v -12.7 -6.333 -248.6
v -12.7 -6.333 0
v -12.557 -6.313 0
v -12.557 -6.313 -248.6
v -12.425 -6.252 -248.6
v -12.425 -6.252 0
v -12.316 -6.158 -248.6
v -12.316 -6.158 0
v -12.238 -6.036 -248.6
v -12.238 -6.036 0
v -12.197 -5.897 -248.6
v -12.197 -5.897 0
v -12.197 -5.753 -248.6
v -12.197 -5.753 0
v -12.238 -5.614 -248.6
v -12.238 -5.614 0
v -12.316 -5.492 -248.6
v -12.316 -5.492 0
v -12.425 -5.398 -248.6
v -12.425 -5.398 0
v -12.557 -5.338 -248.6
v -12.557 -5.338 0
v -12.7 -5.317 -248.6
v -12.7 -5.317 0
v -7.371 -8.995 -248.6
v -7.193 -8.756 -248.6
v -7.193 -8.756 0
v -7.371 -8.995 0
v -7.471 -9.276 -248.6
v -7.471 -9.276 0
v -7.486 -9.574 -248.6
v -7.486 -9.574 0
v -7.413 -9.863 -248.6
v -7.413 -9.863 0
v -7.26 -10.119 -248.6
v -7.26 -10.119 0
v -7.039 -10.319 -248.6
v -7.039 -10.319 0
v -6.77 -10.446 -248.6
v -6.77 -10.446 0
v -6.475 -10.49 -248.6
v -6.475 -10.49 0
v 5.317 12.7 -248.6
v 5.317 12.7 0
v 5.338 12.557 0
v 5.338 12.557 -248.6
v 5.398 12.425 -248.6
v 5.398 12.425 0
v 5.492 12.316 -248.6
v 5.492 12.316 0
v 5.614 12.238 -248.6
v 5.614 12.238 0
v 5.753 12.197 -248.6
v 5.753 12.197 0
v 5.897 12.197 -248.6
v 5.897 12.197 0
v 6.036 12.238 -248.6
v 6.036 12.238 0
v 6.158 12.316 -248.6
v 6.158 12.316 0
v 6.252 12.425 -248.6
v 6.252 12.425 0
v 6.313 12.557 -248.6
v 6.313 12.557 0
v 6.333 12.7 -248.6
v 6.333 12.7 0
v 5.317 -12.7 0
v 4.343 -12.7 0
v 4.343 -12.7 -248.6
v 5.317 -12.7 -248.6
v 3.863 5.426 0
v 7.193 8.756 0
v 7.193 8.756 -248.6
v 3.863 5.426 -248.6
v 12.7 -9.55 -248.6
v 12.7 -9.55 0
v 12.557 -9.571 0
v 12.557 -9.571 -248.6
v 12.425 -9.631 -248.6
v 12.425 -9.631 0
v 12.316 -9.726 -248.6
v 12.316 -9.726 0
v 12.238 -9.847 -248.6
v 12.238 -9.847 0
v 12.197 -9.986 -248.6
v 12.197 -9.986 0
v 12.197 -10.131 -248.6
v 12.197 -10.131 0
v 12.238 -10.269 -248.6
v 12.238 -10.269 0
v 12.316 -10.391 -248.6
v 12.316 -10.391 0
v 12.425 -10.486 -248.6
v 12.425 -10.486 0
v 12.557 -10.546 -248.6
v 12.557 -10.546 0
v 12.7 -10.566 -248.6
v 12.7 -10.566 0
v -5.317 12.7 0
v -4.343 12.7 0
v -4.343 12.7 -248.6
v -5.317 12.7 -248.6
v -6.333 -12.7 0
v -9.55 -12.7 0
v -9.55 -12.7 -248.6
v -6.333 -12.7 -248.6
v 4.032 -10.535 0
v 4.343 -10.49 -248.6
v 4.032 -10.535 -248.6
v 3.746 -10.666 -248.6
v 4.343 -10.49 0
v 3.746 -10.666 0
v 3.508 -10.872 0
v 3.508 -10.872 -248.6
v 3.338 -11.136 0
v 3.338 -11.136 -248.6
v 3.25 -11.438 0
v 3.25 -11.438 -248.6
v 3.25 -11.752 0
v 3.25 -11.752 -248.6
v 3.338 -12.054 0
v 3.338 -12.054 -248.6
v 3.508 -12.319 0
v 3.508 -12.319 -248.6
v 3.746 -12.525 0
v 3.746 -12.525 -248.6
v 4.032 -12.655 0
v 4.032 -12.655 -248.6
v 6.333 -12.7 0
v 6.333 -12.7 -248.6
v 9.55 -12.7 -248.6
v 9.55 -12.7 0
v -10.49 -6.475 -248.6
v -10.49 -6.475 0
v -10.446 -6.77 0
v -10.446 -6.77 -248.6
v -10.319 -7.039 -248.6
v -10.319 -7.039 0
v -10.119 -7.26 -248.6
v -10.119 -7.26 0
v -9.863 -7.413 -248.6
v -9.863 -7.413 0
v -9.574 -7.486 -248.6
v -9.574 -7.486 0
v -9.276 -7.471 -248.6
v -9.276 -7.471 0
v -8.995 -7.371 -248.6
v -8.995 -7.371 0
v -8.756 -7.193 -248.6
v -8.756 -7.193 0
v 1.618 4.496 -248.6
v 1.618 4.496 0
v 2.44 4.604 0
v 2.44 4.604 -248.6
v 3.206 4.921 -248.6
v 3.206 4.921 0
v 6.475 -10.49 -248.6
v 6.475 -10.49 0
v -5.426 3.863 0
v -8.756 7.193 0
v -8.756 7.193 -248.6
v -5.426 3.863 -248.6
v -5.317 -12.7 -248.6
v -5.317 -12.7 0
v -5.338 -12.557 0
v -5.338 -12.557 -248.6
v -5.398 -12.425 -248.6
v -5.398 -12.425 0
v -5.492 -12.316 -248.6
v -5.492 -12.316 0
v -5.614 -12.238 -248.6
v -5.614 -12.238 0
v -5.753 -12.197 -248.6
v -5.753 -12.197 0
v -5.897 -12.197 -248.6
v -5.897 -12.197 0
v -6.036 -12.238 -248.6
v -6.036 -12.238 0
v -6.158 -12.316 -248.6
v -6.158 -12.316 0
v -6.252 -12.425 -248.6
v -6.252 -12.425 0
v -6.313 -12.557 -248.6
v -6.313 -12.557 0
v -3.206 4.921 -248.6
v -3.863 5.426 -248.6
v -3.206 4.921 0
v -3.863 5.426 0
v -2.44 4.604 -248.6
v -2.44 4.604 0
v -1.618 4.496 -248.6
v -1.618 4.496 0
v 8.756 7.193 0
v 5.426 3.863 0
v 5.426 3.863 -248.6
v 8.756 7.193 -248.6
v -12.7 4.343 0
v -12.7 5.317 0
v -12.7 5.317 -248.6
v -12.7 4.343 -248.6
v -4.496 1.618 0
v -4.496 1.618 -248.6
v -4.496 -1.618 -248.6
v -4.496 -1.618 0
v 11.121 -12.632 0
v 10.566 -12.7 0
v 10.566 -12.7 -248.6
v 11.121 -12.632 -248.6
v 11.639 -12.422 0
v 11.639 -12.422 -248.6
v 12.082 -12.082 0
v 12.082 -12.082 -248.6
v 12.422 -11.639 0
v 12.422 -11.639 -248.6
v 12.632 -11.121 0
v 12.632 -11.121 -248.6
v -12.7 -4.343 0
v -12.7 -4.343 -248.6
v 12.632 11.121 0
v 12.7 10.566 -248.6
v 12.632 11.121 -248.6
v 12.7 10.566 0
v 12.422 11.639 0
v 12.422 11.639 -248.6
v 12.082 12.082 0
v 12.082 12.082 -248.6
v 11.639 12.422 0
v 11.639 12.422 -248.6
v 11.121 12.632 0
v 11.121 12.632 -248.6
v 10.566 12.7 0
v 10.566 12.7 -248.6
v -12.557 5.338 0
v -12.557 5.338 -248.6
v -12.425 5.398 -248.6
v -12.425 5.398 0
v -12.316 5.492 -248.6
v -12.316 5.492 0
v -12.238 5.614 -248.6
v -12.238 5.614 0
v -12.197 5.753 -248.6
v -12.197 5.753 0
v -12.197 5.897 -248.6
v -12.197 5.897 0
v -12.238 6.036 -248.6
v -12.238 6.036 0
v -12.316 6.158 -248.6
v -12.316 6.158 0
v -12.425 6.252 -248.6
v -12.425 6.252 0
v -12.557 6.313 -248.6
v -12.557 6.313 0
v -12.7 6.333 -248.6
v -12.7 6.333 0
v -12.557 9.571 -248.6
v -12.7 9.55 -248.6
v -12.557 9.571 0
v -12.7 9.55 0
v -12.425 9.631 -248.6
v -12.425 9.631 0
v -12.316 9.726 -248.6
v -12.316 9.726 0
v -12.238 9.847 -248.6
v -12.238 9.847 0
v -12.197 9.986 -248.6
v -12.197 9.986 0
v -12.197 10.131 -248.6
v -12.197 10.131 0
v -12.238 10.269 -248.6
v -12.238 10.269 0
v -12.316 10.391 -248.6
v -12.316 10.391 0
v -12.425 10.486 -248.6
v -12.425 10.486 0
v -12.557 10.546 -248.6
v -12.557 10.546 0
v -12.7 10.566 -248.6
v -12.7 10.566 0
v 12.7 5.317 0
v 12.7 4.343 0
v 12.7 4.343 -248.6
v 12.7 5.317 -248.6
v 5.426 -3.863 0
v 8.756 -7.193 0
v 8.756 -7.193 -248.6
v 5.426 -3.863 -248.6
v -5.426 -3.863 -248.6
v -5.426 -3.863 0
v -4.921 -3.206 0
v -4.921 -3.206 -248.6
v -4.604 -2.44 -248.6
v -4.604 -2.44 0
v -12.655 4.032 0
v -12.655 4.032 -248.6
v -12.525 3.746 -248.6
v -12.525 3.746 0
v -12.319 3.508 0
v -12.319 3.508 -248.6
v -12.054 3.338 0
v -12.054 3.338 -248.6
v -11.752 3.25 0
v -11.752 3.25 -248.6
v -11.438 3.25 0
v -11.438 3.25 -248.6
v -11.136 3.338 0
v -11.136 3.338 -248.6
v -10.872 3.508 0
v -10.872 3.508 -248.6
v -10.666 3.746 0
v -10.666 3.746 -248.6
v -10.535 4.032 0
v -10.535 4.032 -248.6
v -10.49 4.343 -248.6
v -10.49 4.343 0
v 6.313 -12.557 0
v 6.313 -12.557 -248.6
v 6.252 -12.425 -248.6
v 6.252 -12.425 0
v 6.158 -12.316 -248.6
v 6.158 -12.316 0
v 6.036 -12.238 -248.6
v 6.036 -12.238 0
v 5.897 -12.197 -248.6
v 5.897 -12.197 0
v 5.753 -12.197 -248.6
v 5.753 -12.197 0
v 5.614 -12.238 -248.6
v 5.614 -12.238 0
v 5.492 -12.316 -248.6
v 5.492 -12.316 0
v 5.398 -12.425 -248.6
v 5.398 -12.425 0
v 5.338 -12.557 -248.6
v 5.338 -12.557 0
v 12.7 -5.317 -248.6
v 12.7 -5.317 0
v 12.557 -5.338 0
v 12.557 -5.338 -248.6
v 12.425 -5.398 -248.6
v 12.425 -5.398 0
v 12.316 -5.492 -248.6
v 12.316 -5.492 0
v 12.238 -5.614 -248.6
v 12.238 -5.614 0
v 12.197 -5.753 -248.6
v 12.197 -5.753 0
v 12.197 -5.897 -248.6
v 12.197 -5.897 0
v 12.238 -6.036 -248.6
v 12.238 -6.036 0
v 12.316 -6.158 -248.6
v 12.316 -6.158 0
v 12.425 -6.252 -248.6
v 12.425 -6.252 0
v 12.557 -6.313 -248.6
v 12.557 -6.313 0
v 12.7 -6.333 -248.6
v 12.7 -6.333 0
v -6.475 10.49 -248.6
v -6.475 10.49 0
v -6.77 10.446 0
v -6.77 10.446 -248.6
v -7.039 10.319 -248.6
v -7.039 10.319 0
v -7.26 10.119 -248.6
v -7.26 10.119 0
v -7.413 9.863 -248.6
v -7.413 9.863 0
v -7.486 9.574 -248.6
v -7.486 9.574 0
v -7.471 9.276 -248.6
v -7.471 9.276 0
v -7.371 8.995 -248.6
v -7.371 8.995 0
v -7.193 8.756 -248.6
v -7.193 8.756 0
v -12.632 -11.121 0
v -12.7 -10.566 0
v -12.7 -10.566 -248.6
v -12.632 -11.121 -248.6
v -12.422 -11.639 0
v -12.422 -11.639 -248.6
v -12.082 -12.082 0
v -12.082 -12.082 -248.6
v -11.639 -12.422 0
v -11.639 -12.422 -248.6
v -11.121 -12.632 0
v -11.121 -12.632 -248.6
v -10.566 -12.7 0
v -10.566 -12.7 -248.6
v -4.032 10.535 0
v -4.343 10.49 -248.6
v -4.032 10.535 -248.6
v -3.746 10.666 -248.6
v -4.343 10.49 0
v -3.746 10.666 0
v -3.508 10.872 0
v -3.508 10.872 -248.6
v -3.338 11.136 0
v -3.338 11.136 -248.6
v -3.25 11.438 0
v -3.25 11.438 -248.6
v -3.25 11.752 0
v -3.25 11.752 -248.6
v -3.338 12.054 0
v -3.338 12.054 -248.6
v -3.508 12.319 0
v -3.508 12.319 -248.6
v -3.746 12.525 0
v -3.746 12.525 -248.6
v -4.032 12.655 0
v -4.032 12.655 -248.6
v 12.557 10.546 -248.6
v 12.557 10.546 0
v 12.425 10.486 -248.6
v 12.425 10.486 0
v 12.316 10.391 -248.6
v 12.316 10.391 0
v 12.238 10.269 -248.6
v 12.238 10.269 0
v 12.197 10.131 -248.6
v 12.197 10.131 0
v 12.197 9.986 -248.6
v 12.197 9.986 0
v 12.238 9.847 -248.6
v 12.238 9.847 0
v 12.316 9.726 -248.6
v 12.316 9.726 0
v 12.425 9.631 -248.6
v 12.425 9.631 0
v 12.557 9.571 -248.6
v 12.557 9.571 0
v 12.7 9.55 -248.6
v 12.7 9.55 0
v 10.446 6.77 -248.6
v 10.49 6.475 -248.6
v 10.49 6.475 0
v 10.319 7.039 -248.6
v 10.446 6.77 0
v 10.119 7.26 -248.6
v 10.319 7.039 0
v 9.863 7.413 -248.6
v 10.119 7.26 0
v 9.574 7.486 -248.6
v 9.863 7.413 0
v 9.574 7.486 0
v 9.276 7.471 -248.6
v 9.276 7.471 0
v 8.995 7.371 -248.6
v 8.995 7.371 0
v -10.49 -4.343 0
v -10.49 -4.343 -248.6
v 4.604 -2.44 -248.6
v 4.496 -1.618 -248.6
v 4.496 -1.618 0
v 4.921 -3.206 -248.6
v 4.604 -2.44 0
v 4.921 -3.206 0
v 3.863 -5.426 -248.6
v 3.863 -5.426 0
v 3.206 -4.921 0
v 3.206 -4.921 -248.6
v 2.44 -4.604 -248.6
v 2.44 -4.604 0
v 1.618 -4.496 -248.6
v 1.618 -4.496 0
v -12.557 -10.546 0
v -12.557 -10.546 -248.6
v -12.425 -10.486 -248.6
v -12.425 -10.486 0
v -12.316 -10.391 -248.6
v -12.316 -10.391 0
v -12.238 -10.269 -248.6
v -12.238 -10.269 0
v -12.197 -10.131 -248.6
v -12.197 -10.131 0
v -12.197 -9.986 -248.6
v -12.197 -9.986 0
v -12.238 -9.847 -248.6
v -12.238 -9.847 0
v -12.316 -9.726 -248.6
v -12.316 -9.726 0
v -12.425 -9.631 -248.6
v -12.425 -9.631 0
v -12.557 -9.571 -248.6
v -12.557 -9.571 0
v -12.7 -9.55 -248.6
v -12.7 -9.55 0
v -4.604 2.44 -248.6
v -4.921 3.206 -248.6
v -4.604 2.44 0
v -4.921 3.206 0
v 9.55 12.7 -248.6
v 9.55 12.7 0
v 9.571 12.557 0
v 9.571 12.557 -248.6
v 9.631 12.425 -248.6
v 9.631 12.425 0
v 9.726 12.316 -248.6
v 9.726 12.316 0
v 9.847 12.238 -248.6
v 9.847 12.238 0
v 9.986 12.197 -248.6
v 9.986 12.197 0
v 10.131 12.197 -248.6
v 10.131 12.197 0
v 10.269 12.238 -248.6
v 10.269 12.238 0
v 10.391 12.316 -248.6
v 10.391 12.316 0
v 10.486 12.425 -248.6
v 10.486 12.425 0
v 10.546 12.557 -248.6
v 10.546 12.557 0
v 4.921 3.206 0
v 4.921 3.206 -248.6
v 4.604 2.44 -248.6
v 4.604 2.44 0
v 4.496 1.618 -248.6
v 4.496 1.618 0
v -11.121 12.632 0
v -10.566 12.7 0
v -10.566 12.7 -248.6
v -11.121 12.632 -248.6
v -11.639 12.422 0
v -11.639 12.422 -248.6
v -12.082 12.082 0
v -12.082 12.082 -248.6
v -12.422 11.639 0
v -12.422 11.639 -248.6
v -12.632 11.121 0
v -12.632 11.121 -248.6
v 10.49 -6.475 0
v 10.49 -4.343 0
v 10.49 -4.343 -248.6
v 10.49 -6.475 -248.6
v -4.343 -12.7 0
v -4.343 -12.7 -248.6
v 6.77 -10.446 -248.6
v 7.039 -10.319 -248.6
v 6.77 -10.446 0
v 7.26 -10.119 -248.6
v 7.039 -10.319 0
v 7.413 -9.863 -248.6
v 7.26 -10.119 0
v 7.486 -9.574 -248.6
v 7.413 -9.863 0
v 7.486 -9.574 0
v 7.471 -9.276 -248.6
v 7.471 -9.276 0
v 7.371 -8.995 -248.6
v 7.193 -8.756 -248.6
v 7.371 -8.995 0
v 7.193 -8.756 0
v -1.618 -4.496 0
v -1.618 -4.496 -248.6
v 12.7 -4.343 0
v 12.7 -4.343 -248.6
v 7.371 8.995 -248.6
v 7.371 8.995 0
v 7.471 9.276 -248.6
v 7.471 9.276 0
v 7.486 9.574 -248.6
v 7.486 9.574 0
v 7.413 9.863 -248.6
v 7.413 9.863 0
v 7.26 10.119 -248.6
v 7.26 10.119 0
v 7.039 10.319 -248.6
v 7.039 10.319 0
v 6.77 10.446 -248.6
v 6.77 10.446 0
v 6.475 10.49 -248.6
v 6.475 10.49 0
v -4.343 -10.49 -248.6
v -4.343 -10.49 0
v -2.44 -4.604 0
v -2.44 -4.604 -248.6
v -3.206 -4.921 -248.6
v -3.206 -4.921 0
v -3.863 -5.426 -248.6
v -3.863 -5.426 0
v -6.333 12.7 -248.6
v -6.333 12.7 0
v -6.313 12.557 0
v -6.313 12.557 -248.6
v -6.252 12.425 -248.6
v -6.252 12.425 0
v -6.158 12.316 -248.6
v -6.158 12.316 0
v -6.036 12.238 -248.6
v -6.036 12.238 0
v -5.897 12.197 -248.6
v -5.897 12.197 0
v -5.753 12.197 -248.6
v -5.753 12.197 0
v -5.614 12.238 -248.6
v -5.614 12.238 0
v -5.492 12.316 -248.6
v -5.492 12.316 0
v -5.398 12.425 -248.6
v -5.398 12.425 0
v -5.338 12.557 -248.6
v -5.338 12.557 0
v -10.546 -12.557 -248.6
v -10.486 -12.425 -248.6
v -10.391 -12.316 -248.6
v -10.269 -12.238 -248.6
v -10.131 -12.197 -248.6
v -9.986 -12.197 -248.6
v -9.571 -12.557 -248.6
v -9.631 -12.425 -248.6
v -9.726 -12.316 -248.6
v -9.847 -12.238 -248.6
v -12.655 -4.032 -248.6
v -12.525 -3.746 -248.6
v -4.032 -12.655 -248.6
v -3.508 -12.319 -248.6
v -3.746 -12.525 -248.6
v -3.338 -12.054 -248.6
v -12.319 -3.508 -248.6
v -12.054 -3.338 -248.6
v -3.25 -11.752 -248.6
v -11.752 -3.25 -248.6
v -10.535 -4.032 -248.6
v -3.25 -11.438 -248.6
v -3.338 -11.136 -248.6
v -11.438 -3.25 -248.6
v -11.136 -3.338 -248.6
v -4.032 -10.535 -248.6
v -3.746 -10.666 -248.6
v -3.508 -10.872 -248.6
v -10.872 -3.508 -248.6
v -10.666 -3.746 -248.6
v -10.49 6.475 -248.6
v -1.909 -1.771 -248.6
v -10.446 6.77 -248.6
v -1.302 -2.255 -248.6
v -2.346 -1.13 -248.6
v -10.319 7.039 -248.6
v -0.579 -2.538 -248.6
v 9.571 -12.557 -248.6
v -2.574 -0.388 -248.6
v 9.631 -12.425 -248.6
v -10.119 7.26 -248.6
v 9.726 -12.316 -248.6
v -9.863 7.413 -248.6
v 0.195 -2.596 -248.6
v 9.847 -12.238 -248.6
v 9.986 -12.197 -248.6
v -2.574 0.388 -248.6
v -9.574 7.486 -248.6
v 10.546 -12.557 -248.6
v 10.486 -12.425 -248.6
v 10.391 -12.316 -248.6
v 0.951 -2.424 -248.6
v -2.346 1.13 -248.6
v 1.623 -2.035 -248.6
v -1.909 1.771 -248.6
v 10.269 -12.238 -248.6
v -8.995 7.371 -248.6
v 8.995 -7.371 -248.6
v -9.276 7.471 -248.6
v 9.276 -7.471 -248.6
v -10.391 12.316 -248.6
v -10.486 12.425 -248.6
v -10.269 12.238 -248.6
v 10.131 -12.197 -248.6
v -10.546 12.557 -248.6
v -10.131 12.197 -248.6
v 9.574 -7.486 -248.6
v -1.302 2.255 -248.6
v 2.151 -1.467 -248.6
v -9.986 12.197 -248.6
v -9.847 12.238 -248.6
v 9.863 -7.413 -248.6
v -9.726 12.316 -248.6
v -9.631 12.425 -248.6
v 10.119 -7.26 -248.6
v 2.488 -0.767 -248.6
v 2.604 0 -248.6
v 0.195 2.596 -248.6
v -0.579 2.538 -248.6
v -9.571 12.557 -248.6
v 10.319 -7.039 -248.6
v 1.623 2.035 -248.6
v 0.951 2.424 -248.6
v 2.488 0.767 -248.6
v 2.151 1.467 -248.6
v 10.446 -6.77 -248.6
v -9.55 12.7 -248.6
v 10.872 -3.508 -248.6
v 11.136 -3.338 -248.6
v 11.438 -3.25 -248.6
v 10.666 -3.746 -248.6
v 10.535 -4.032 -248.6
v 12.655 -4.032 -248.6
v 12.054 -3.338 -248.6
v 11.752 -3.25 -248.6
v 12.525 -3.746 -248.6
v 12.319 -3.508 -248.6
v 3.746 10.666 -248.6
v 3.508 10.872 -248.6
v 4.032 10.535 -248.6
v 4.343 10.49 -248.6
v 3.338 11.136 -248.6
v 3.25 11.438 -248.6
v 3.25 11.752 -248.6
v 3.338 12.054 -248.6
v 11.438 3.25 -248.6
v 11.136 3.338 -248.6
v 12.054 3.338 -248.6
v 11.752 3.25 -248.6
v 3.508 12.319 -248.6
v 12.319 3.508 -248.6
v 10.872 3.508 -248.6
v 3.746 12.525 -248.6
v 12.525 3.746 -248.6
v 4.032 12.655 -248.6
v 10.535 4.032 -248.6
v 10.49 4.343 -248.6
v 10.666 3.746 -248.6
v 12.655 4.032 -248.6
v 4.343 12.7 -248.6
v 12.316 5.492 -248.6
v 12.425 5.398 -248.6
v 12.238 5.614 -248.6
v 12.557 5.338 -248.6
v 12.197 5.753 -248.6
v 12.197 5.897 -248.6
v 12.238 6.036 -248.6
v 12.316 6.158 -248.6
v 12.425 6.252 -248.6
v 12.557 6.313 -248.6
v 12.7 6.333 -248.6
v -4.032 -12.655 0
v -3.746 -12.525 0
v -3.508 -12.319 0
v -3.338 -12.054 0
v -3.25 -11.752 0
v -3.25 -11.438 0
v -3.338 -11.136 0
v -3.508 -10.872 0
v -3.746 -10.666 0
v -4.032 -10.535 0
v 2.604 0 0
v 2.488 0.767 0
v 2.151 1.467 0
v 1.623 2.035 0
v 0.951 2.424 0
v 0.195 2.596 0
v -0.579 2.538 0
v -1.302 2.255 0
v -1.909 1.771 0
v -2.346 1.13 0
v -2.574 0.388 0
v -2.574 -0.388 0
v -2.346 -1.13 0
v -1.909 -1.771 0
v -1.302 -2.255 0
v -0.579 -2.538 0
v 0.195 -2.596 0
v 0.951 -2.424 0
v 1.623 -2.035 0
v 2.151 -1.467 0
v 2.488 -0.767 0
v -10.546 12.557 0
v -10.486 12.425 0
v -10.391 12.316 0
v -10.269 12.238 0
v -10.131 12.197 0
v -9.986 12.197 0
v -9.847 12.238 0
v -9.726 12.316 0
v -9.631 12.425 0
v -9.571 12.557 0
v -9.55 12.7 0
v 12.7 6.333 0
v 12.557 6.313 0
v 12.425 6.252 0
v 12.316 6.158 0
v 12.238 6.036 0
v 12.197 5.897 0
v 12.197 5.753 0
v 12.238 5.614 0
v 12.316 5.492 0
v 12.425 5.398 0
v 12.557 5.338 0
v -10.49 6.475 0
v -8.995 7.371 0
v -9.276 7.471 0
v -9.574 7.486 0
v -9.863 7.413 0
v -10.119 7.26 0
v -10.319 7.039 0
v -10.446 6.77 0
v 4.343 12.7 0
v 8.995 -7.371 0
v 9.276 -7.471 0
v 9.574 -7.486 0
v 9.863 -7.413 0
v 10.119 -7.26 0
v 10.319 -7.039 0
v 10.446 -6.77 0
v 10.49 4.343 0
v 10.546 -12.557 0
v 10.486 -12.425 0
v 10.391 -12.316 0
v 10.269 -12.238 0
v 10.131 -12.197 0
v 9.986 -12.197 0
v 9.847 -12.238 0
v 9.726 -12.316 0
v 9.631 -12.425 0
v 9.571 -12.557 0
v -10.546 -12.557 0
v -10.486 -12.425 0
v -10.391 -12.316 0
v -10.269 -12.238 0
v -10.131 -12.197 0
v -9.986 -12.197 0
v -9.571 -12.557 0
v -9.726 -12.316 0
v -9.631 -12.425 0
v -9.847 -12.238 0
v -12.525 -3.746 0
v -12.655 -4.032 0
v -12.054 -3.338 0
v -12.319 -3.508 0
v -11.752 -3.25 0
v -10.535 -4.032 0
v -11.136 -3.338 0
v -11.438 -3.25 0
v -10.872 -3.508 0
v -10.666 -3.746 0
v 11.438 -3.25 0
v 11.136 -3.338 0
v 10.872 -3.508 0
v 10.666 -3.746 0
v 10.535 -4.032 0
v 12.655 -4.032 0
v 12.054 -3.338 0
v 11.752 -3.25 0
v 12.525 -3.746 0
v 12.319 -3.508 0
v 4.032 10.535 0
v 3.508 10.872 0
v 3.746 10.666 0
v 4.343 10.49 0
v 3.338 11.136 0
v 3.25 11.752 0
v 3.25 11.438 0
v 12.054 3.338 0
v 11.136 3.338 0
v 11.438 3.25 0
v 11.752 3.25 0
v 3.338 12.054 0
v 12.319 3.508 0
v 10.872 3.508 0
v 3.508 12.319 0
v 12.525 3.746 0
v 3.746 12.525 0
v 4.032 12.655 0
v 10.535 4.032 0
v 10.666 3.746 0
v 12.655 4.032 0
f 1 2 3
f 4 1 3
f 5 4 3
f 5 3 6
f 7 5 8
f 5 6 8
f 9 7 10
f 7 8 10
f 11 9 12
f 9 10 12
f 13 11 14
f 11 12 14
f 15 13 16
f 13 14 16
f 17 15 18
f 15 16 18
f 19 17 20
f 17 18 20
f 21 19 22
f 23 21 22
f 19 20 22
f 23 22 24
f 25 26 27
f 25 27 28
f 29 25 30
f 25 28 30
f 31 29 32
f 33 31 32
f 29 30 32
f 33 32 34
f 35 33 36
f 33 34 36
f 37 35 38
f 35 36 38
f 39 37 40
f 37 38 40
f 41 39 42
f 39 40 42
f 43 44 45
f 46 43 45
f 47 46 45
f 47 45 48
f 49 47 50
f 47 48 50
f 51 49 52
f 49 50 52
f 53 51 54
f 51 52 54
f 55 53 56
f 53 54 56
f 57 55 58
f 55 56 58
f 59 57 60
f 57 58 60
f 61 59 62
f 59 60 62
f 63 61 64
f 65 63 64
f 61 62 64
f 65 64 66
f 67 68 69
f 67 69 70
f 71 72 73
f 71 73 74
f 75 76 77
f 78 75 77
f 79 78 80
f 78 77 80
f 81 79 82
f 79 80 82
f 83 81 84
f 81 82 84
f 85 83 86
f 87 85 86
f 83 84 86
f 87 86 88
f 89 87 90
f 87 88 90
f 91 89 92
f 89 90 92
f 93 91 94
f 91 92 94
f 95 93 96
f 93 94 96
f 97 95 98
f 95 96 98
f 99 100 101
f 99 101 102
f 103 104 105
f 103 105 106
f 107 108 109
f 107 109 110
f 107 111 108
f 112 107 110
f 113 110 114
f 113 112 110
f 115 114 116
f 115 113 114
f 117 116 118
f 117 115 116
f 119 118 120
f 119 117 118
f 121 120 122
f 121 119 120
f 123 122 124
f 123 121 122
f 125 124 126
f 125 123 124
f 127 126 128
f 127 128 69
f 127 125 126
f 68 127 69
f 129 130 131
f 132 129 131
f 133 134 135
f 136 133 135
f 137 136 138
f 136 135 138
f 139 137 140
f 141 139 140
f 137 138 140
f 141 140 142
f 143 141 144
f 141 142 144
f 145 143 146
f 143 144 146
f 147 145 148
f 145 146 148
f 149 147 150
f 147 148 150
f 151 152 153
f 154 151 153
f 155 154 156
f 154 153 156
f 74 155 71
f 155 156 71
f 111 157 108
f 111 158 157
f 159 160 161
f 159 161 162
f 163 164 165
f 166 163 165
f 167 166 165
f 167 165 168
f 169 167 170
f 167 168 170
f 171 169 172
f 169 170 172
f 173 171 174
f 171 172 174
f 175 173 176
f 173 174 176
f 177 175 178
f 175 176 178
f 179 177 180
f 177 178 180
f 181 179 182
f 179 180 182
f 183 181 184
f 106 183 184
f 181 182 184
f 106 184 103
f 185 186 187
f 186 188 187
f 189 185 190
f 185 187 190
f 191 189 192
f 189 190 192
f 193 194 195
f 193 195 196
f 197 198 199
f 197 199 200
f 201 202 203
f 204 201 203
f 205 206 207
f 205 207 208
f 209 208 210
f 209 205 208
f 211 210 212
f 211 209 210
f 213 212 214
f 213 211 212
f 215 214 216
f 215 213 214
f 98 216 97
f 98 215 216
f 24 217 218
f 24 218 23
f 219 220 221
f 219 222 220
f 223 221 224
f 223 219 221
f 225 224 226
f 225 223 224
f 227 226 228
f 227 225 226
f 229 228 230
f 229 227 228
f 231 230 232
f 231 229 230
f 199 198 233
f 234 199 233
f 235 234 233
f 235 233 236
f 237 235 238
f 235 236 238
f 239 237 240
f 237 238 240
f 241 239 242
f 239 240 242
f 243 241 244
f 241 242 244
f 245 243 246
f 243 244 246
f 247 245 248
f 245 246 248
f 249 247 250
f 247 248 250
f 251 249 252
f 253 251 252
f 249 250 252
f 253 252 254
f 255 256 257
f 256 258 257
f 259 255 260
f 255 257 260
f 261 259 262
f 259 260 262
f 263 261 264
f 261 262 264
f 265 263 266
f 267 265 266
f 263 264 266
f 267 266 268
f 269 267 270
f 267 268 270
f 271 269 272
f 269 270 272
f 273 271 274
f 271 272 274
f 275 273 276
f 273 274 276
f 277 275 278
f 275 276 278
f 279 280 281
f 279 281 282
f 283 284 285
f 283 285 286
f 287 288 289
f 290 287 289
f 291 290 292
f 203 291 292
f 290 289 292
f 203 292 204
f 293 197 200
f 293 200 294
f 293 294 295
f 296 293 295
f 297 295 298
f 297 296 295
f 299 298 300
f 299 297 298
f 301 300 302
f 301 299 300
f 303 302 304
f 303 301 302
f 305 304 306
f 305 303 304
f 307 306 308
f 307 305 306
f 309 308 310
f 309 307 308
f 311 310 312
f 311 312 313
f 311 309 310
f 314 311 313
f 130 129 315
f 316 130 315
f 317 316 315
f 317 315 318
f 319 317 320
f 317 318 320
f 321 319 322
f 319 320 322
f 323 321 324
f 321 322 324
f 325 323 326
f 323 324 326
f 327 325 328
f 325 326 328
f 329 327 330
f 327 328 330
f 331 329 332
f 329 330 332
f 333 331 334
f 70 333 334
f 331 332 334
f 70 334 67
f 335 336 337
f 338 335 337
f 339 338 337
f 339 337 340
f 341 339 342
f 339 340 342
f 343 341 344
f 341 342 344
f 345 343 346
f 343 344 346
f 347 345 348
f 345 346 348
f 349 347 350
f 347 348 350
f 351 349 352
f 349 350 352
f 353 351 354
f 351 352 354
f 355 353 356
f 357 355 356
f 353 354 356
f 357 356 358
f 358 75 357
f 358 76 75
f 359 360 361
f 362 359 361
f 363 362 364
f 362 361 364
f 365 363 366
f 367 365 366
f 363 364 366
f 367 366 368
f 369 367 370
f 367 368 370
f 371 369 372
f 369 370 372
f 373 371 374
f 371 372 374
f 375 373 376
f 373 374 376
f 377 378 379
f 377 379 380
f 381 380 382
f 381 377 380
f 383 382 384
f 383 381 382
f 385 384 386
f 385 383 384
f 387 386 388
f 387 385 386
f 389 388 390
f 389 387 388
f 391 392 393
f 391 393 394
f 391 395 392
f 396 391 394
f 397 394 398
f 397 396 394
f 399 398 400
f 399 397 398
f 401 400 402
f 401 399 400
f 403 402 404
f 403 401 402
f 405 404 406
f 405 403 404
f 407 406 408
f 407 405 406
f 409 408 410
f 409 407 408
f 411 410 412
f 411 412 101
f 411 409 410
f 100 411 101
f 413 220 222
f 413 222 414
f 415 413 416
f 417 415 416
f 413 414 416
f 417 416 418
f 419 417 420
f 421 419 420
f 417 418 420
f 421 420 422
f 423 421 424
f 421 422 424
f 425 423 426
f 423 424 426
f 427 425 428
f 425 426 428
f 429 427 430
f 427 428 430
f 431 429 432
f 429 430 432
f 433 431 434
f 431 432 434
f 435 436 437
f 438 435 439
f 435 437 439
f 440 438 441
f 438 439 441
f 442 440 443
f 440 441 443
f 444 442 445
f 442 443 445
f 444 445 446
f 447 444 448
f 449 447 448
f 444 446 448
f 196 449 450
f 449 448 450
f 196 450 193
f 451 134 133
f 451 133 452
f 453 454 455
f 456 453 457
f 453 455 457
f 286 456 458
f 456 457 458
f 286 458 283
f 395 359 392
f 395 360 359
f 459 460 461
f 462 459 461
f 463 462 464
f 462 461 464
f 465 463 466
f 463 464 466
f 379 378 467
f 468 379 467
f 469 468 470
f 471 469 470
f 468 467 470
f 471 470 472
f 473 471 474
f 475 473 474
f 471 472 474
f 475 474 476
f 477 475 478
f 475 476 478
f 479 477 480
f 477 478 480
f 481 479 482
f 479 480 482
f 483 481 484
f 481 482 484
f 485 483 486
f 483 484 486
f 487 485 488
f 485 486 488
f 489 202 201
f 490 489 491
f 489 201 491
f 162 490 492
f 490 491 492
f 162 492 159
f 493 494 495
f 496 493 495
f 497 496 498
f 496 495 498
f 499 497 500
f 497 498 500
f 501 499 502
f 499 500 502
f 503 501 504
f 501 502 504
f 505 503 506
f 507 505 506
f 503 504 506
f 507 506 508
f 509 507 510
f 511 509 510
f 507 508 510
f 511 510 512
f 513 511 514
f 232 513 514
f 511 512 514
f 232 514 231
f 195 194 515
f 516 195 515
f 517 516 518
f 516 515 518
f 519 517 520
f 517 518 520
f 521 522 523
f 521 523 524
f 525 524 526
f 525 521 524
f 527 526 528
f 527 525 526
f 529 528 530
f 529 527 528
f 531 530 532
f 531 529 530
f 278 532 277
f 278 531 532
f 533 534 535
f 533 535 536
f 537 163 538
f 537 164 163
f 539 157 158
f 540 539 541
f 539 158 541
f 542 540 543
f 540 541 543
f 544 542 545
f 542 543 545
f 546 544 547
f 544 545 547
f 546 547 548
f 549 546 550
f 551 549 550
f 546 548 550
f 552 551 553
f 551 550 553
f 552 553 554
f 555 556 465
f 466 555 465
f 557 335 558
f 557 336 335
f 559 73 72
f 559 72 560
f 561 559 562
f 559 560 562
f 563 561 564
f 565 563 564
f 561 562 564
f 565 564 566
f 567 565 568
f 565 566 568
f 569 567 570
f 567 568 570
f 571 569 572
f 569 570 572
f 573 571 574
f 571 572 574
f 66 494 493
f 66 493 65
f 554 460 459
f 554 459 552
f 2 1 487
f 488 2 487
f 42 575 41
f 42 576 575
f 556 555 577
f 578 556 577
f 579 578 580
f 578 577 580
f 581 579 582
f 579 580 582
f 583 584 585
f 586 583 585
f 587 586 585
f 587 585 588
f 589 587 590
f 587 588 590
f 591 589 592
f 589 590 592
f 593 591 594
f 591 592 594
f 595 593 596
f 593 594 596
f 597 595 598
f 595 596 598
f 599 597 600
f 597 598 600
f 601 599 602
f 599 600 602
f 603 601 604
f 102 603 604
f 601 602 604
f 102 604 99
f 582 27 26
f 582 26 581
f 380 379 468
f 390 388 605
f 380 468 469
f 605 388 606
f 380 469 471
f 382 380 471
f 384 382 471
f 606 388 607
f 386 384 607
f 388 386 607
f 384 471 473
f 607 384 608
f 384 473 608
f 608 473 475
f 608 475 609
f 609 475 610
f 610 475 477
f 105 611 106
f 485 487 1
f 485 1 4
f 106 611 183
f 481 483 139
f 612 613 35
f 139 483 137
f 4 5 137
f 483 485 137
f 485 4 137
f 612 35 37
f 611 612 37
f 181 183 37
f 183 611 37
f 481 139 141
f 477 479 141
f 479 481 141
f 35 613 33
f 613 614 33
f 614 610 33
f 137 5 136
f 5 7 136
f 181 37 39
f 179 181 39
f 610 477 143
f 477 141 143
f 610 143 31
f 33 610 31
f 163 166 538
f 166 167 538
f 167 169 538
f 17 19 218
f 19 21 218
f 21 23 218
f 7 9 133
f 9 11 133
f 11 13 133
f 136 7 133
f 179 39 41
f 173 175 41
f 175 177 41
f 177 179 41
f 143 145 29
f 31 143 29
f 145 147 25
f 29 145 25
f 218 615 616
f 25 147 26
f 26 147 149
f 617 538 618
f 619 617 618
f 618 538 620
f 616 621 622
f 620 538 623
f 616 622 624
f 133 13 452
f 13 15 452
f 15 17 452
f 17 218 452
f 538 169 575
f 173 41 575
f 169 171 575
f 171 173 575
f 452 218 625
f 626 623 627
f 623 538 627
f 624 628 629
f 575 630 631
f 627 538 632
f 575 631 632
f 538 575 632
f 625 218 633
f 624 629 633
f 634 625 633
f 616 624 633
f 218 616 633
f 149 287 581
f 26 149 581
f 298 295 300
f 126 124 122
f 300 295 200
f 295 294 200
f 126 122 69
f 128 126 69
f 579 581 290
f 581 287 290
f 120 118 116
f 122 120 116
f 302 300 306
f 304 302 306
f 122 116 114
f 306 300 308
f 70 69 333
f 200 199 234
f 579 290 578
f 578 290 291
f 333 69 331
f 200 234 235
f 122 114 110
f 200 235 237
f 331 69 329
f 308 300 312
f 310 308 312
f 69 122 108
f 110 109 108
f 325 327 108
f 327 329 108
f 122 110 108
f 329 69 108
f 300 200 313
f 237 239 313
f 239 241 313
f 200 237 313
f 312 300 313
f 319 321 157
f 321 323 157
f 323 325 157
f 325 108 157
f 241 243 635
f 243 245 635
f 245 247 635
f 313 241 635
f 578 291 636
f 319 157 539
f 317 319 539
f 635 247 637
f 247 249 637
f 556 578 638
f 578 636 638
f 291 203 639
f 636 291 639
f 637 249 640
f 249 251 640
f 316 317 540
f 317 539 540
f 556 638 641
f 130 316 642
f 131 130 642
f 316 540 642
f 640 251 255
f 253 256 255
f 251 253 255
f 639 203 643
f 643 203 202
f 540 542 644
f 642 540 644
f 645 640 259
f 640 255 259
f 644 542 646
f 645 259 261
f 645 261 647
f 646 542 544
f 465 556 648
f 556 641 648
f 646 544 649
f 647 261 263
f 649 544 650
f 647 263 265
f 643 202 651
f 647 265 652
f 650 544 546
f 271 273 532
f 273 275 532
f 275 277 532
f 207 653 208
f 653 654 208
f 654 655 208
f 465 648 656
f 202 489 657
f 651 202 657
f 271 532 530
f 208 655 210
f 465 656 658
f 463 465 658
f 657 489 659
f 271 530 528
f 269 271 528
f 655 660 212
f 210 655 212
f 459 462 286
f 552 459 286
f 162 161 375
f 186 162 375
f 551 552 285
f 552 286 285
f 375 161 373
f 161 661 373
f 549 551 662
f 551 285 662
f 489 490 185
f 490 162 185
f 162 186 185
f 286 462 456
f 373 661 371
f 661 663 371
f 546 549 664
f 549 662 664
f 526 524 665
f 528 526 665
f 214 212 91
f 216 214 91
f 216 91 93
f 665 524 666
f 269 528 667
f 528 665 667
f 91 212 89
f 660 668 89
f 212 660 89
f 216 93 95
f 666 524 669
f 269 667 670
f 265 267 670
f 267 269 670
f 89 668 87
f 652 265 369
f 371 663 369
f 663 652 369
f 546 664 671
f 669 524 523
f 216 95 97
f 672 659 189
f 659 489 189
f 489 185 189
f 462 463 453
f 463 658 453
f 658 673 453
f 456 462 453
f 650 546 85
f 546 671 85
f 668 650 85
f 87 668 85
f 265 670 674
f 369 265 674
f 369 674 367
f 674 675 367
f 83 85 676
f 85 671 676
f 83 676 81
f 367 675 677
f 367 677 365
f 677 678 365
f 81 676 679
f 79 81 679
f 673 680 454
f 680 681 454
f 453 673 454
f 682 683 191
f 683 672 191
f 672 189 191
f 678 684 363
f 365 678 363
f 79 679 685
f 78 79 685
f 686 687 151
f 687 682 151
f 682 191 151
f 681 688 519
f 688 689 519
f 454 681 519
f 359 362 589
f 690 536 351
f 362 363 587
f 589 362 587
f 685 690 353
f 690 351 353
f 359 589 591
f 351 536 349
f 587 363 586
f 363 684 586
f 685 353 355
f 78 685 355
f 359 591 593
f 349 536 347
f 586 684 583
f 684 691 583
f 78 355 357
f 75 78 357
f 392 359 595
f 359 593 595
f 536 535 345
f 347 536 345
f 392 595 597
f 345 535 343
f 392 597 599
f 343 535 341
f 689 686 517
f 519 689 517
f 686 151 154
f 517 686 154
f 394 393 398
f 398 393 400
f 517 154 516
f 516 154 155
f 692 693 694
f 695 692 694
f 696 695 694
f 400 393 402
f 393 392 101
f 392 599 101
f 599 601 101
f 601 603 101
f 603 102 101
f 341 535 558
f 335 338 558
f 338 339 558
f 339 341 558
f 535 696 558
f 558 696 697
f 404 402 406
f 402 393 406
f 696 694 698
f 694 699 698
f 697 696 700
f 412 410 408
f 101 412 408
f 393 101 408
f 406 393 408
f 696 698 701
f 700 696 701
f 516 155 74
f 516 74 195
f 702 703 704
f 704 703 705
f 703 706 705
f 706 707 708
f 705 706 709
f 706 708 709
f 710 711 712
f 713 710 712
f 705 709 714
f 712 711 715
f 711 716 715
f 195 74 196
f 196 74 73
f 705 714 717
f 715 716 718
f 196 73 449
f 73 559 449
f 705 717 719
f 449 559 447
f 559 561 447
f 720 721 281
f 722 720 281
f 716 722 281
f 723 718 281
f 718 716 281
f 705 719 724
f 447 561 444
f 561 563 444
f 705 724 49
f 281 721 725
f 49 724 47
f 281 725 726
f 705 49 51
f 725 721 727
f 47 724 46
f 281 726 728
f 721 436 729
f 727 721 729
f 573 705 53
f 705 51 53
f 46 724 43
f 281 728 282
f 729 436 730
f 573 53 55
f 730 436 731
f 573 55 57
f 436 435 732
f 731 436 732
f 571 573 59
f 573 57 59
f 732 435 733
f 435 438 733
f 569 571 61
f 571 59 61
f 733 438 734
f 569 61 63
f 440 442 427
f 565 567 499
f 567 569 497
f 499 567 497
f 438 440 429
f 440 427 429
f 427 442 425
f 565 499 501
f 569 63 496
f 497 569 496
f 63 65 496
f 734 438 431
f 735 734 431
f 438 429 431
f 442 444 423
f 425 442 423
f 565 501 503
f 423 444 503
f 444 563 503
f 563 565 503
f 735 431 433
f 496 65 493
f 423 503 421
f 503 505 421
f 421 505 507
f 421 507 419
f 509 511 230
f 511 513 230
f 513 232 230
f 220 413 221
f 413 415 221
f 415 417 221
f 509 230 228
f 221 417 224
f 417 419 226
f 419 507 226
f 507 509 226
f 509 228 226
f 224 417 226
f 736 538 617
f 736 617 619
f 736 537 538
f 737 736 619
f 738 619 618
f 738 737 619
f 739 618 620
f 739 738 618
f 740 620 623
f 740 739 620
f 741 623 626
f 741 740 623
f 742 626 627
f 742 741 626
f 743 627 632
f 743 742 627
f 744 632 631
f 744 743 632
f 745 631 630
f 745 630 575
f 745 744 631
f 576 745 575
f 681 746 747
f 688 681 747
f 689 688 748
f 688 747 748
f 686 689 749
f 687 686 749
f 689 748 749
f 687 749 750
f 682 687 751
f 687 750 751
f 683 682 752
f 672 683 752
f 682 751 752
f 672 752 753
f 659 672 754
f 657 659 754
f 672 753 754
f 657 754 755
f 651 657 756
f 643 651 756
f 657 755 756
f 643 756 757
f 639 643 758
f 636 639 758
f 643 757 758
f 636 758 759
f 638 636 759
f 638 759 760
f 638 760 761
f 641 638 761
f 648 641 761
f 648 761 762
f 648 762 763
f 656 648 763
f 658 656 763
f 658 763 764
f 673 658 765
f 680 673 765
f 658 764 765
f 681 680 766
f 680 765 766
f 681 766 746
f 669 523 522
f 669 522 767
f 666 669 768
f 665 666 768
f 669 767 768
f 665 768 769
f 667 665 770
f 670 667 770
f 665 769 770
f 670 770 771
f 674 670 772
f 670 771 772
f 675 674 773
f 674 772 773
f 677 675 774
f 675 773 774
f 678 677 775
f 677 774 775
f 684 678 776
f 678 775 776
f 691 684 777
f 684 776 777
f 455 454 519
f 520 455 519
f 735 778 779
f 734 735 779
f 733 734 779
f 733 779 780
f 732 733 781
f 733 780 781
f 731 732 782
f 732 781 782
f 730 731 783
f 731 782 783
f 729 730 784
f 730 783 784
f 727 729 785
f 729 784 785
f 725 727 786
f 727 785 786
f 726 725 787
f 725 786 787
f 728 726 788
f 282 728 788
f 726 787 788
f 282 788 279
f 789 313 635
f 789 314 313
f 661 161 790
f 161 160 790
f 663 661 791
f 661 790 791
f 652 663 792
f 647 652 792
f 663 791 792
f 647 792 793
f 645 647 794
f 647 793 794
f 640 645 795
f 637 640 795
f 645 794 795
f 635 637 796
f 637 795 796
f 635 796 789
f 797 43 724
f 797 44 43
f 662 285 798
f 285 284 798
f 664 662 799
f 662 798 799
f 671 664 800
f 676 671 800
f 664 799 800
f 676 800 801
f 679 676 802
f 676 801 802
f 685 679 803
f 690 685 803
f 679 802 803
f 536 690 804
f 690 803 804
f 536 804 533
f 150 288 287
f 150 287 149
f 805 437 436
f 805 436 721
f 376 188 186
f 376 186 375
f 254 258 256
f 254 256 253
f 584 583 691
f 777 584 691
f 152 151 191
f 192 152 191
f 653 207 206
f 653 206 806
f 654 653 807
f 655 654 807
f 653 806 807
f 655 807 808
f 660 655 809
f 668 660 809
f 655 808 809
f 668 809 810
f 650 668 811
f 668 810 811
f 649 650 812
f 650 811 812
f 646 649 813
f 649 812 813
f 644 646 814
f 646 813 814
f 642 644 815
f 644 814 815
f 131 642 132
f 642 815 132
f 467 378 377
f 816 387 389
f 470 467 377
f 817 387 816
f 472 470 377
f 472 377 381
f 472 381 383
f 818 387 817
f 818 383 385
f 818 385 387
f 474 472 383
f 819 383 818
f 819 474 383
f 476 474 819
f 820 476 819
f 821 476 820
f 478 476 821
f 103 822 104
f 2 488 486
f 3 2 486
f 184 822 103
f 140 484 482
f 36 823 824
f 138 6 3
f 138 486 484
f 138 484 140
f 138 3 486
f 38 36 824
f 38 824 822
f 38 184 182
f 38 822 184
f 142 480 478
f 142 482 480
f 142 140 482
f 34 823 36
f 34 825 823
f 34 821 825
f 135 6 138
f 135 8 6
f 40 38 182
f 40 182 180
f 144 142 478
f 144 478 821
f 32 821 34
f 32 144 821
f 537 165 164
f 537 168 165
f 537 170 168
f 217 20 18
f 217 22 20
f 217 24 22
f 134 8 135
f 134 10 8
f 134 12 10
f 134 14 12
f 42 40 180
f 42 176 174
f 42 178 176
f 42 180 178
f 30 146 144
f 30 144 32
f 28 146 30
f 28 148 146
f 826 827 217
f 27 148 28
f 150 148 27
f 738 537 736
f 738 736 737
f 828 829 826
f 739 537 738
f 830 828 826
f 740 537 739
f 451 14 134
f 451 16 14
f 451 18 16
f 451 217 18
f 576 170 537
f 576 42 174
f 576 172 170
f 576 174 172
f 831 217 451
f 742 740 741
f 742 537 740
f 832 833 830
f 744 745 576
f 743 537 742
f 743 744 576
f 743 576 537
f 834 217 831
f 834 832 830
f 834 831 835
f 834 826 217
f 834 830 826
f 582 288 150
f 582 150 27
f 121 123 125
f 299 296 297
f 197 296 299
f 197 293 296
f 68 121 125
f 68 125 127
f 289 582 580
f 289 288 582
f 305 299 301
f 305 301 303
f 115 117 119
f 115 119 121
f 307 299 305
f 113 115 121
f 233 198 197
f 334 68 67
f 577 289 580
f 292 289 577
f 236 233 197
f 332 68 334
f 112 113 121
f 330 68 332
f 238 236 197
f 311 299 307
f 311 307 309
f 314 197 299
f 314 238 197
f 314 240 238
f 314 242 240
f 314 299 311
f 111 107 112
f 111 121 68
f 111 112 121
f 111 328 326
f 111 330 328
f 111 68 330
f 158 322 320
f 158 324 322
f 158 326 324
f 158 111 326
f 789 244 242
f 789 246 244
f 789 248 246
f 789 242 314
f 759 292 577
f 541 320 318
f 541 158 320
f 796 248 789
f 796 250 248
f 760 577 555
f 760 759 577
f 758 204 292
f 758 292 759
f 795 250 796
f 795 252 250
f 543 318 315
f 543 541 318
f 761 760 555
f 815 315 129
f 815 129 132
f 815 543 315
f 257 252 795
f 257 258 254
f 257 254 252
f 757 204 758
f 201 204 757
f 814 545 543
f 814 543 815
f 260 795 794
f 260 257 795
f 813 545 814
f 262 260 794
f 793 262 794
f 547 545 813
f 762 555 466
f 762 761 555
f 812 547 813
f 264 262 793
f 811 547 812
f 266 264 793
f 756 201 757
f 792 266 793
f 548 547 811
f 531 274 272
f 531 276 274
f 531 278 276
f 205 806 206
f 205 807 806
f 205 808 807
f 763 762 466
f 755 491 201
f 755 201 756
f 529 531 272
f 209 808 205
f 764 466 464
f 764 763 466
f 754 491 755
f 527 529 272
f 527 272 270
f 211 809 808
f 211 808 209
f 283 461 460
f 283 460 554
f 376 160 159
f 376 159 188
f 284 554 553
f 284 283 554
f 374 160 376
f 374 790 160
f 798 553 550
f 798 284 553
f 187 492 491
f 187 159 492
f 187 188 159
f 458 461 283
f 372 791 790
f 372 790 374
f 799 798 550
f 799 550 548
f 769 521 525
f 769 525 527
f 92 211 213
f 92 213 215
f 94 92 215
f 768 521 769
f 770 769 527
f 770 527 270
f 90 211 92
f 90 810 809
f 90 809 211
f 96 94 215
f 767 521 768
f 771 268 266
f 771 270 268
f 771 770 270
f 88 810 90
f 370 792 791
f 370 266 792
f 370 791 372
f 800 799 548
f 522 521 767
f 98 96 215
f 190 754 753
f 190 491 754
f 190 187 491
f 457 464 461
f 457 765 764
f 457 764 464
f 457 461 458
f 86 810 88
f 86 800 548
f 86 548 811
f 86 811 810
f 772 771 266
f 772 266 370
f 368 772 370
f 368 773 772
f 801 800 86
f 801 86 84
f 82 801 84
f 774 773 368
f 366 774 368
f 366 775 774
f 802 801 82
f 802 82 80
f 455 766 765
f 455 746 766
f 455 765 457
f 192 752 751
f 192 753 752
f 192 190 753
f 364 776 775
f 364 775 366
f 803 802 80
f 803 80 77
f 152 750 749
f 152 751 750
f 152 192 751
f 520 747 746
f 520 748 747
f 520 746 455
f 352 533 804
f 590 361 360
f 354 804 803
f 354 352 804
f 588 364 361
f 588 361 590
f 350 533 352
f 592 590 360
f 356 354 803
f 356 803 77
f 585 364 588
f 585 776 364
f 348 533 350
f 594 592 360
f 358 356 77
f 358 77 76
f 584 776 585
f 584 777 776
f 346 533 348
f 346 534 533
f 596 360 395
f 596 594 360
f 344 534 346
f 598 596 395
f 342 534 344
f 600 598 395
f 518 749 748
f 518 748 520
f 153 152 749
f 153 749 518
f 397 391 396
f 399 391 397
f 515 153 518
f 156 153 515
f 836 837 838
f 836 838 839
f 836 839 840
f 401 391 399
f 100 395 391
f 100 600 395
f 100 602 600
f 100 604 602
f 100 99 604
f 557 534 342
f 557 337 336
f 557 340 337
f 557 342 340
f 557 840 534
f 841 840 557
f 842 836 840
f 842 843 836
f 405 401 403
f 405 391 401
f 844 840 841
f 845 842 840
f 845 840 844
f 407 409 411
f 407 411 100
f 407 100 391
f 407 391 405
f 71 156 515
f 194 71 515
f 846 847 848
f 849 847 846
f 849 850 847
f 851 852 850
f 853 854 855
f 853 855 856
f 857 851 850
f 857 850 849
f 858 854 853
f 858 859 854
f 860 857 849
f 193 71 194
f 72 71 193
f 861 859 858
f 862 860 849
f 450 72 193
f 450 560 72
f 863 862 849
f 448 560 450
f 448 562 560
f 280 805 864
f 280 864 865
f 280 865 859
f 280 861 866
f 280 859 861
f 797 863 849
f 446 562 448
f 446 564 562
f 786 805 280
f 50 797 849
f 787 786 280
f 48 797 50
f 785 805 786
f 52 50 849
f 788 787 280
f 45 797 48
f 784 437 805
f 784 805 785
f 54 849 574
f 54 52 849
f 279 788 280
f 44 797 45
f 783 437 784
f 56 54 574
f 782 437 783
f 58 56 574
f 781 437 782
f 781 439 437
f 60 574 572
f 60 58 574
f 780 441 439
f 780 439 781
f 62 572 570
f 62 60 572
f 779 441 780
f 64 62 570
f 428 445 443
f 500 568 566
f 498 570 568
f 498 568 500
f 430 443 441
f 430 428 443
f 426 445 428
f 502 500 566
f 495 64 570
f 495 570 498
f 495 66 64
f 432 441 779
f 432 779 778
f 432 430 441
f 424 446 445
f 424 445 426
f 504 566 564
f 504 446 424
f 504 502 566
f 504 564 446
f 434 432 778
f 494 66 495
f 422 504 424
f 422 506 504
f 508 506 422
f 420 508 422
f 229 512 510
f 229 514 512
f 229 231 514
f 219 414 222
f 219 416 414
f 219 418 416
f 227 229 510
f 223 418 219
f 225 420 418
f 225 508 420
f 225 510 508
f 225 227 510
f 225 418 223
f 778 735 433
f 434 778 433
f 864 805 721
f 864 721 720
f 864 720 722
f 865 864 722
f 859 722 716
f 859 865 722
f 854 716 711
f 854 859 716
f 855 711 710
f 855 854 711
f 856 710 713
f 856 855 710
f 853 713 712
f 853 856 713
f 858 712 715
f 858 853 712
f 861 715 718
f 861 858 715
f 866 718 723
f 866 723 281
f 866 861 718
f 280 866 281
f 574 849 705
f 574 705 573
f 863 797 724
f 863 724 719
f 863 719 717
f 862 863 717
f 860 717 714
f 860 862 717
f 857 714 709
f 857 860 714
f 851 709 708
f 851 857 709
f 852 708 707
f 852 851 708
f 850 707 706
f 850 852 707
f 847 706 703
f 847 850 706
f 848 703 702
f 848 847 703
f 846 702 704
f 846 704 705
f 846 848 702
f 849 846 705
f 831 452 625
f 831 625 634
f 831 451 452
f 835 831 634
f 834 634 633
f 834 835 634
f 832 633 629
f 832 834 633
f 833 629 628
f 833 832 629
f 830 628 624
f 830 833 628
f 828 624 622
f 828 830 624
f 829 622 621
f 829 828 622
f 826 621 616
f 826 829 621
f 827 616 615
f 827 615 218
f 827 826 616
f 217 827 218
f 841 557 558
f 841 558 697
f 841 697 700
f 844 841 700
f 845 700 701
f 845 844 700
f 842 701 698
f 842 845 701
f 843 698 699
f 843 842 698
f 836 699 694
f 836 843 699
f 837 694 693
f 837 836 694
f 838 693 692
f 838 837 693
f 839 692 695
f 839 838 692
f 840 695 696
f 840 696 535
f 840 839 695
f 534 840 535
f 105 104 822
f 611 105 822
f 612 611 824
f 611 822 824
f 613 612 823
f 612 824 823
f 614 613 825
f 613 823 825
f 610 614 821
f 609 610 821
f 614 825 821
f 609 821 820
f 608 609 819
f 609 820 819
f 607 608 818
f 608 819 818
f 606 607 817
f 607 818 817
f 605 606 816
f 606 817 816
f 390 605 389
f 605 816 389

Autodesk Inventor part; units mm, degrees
sketch "Sketch_1" plane through (0, 0, 0) normal (0, 0, 1) x (1, 0, 0)
  arc A0 (-12.6998, -10.5664) -> (-10.5664, -12.6998) centre (-10.5918, -10.5918) ccw
  arc A1 (-9.5504, -12.7) -> (-10.5664, -12.6998) centre (-10.0584, -12.7) ccw
  line L0 (-9.5504, -12.7) -> (-6.3331, -12.7)
  arc A2 (-5.3171, -12.7) -> (-6.3331, -12.7) centre (-5.8251, -12.7) ccw
  line L1 (-5.3171, -12.7) -> (-4.3434, -12.7)
  arc A3 (-4.3434, -12.7) -> (-4.3434, -10.4902) centre (-4.3434, -11.5951) ccw
  line L2 (-4.3434, -10.4902) -> (-6.4748, -10.4902)
  arc A4 (-7.1932, -8.7558) -> (-6.4748, -10.4902) centre (-6.4748, -9.4742) ccw
  line L3 (-7.1932, -8.7558) -> (-3.8632, -5.4257)
  arc A5 (-1.6181, -4.4958) -> (-3.8632, -5.4257) centre (-1.6181, -7.6708) ccw
  line L4 (-1.6181, -4.4958) -> (1.6181, -4.4958)
  arc A6 (3.8632, -5.4257) -> (1.6181, -4.4958) centre (1.6181, -7.6708) ccw
  line L5 (3.8632, -5.4257) -> (7.1932, -8.7558)
  arc A7 (6.4748, -10.4902) -> (7.1932, -8.7558) centre (6.4748, -9.4742) ccw
  line L6 (6.4748, -10.4902) -> (4.3434, -10.4902)
  arc A8 (4.3434, -10.4902) -> (4.3434, -12.7) centre (4.3434, -11.5951) ccw
  line L7 (4.3434, -12.7) -> (5.3171, -12.7)
  arc A9 (6.3331, -12.7) -> (5.3171, -12.7) centre (5.8251, -12.7) ccw
  line L8 (6.3331, -12.7) -> (9.5504, -12.7)
  arc A10 (10.5664, -12.6998) -> (9.5504, -12.7) centre (10.0584, -12.7) ccw
  arc A11 (10.5664, -12.6998) -> (12.6998, -10.5664) centre (10.5918, -10.5918) ccw
  arc A12 (12.7, -9.5504) -> (12.6998, -10.5664) centre (12.7, -10.0584) ccw
  line L9 (12.7, -9.5504) -> (12.7, -6.3331)
  arc A13 (12.7, -5.3171) -> (12.7, -6.3331) centre (12.7, -5.8251) ccw
  line L10 (12.7, -5.3171) -> (12.7, -4.3434)
  arc A14 (12.7, -4.3434) -> (10.4902, -4.3434) centre (11.5951, -4.3434) ccw
  line L11 (10.4902, -4.3434) -> (10.4902, -6.4748)
  arc A15 (8.7558, -7.1932) -> (10.4902, -6.4748) centre (9.4742, -6.4748) ccw
  line L12 (8.7558, -7.1932) -> (5.4257, -3.8632)
  arc A16 (4.4958, -1.6181) -> (5.4257, -3.8632) centre (7.6708, -1.6181) ccw
  line L13 (4.4958, -1.6181) -> (4.4958, 1.6181)
  arc A17 (5.4257, 3.8632) -> (4.4958, 1.6181) centre (7.6708, 1.6181) ccw
  line L14 (5.4257, 3.8632) -> (8.7558, 7.1932)
  arc A18 (10.4902, 6.4748) -> (8.7558, 7.1932) centre (9.4742, 6.4748) ccw
  line L15 (10.4902, 6.4748) -> (10.4902, 4.3434)
  arc A19 (10.4902, 4.3434) -> (12.7, 4.3434) centre (11.5951, 4.3434) ccw
  line L16 (12.7, 4.3434) -> (12.7, 5.3171)
  arc A20 (12.7, 6.3331) -> (12.7, 5.3171) centre (12.7, 5.8251) ccw
  line L17 (12.7, 6.3331) -> (12.7, 9.5504)
  arc A21 (12.6998, 10.5664) -> (12.7, 9.5504) centre (12.7, 10.0584) ccw
  arc A22 (12.6998, 10.5664) -> (10.5664, 12.6998) centre (10.5918, 10.5918) ccw
  arc A23 (9.5504, 12.7) -> (10.5664, 12.6998) centre (10.0584, 12.7) ccw
  line L18 (9.5504, 12.7) -> (6.3331, 12.7)
  arc A24 (5.3171, 12.7) -> (6.3331, 12.7) centre (5.8251, 12.7) ccw
  line L19 (5.3171, 12.7) -> (4.3434, 12.7)
  arc A25 (4.3434, 12.7) -> (4.3434, 10.4902) centre (4.3434, 11.5951) ccw
  line L20 (4.3434, 10.4902) -> (6.4748, 10.4902)
  arc A26 (7.1932, 8.7558) -> (6.4748, 10.4902) centre (6.4748, 9.4742) ccw
  line L21 (7.1932, 8.7558) -> (3.8632, 5.4257)
  arc A27 (1.6181, 4.4958) -> (3.8632, 5.4257) centre (1.6181, 7.6708) ccw
  line L22 (1.6181, 4.4958) -> (-1.6181, 4.4958)
  arc A28 (-3.8632, 5.4257) -> (-1.6181, 4.4958) centre (-1.6181, 7.6708) ccw
  line L23 (-3.8632, 5.4257) -> (-7.1932, 8.7558)
  arc A29 (-6.4748, 10.4902) -> (-7.1932, 8.7558) centre (-6.4748, 9.4742) ccw
  line L24 (-6.4748, 10.4902) -> (-4.3434, 10.4902)
  arc A30 (-4.3434, 10.4902) -> (-4.3434, 12.7) centre (-4.3434, 11.5951) ccw
  line L25 (-4.3434, 12.7) -> (-5.3171, 12.7)
  arc A31 (-6.3331, 12.7) -> (-5.3171, 12.7) centre (-5.8251, 12.7) ccw
  line L26 (-6.3331, 12.7) -> (-9.5504, 12.7)
  arc A32 (-10.5664, 12.6998) -> (-9.5504, 12.7) centre (-10.0584, 12.7) ccw
  arc A33 (-10.5664, 12.6998) -> (-12.6998, 10.5664) centre (-10.5918, 10.5918) ccw
  arc A34 (-12.7, 9.5504) -> (-12.6998, 10.5664) centre (-12.7, 10.0584) ccw
  line L27 (-12.7, 9.5504) -> (-12.7, 6.3331)
  arc A35 (-12.7, 5.3171) -> (-12.7, 6.3331) centre (-12.7, 5.8251) ccw
  line L28 (-12.7, 5.3171) -> (-12.7, 4.3434)
  arc A36 (-12.7, 4.3434) -> (-10.4902, 4.3434) centre (-11.5951, 4.3434) ccw
  line L29 (-10.4902, 4.3434) -> (-10.4902, 6.4748)
  arc A37 (-8.7558, 7.1932) -> (-10.4902, 6.4748) centre (-9.4742, 6.4748) ccw
  line L30 (-8.7558, 7.1932) -> (-5.4257, 3.8632)
  arc A38 (-4.4958, 1.6181) -> (-5.4257, 3.8632) centre (-7.6708, 1.6181) ccw
  line L31 (-4.4958, 1.6181) -> (-4.4958, -1.6181)
  arc A39 (-5.4257, -3.8632) -> (-4.4958, -1.6181) centre (-7.6708, -1.6181) ccw
  line L32 (-5.4257, -3.8632) -> (-8.7558, -7.1932)
  arc A40 (-10.4902, -6.4748) -> (-8.7558, -7.1932) centre (-9.4742, -6.4748) ccw
  line L33 (-10.4902, -6.4748) -> (-10.4902, -4.3434)
  arc A41 (-10.4902, -4.3434) -> (-12.7, -4.3434) centre (-11.5951, -4.3434) ccw
  line L34 (-12.7, -4.3434) -> (-12.7, -5.3171)
  arc A42 (-12.7, -6.3331) -> (-12.7, -5.3171) centre (-12.7, -5.8251) ccw
  line L35 (-12.7, -6.3331) -> (-12.7, -9.5504)
  arc A43 (-12.6998, -10.5664) -> (-12.7, -9.5504) centre (-12.7, -10.0584) ccw
  circle A44 centre (0, 0) radius 2.6035
extrude "Extrusion1" add sketch "Sketch_1" against normal blind 248.6
ref_plane "b1_XY" through (-12.7, 0, -12.7) normal (1, 0, 0) x (0, 0, -1)
ref_plane "b1_YZ" through (-12.7, 0, -12.7) normal (0, 0, -1) x (0, 1, 0)
ref_plane "b1_ZX" through (-12.7, 0, -12.7) normal (0, 1, 0) x (1, 0, 0)
ref_plane "b2_XY" through (12.7, 0, -12.7) normal (1, 0, 0) x (0, 0, -1)
ref_plane "b2_YZ" through (12.7, 0, -12.7) normal (0, 0, -1) x (0, 1, 0)
ref_plane "b2_ZX" through (12.7, 0, -12.7) normal (0, 1, 0) x (1, 0, 0)
ref_plane "profile1010_XY" through (0, 0, -12.7) normal (0, 0, 1) x (1, 0, 0)
ref_plane "profile1010_YZ" through (0, 0, -12.7) normal (1, 0, 0) x (0, 1, 0)
ref_plane "profile1010_ZX" through (0, 0, -12.7) normal (0, 1, 0) x (0, 0, 1)
properties part number "1010_248_6mm"
